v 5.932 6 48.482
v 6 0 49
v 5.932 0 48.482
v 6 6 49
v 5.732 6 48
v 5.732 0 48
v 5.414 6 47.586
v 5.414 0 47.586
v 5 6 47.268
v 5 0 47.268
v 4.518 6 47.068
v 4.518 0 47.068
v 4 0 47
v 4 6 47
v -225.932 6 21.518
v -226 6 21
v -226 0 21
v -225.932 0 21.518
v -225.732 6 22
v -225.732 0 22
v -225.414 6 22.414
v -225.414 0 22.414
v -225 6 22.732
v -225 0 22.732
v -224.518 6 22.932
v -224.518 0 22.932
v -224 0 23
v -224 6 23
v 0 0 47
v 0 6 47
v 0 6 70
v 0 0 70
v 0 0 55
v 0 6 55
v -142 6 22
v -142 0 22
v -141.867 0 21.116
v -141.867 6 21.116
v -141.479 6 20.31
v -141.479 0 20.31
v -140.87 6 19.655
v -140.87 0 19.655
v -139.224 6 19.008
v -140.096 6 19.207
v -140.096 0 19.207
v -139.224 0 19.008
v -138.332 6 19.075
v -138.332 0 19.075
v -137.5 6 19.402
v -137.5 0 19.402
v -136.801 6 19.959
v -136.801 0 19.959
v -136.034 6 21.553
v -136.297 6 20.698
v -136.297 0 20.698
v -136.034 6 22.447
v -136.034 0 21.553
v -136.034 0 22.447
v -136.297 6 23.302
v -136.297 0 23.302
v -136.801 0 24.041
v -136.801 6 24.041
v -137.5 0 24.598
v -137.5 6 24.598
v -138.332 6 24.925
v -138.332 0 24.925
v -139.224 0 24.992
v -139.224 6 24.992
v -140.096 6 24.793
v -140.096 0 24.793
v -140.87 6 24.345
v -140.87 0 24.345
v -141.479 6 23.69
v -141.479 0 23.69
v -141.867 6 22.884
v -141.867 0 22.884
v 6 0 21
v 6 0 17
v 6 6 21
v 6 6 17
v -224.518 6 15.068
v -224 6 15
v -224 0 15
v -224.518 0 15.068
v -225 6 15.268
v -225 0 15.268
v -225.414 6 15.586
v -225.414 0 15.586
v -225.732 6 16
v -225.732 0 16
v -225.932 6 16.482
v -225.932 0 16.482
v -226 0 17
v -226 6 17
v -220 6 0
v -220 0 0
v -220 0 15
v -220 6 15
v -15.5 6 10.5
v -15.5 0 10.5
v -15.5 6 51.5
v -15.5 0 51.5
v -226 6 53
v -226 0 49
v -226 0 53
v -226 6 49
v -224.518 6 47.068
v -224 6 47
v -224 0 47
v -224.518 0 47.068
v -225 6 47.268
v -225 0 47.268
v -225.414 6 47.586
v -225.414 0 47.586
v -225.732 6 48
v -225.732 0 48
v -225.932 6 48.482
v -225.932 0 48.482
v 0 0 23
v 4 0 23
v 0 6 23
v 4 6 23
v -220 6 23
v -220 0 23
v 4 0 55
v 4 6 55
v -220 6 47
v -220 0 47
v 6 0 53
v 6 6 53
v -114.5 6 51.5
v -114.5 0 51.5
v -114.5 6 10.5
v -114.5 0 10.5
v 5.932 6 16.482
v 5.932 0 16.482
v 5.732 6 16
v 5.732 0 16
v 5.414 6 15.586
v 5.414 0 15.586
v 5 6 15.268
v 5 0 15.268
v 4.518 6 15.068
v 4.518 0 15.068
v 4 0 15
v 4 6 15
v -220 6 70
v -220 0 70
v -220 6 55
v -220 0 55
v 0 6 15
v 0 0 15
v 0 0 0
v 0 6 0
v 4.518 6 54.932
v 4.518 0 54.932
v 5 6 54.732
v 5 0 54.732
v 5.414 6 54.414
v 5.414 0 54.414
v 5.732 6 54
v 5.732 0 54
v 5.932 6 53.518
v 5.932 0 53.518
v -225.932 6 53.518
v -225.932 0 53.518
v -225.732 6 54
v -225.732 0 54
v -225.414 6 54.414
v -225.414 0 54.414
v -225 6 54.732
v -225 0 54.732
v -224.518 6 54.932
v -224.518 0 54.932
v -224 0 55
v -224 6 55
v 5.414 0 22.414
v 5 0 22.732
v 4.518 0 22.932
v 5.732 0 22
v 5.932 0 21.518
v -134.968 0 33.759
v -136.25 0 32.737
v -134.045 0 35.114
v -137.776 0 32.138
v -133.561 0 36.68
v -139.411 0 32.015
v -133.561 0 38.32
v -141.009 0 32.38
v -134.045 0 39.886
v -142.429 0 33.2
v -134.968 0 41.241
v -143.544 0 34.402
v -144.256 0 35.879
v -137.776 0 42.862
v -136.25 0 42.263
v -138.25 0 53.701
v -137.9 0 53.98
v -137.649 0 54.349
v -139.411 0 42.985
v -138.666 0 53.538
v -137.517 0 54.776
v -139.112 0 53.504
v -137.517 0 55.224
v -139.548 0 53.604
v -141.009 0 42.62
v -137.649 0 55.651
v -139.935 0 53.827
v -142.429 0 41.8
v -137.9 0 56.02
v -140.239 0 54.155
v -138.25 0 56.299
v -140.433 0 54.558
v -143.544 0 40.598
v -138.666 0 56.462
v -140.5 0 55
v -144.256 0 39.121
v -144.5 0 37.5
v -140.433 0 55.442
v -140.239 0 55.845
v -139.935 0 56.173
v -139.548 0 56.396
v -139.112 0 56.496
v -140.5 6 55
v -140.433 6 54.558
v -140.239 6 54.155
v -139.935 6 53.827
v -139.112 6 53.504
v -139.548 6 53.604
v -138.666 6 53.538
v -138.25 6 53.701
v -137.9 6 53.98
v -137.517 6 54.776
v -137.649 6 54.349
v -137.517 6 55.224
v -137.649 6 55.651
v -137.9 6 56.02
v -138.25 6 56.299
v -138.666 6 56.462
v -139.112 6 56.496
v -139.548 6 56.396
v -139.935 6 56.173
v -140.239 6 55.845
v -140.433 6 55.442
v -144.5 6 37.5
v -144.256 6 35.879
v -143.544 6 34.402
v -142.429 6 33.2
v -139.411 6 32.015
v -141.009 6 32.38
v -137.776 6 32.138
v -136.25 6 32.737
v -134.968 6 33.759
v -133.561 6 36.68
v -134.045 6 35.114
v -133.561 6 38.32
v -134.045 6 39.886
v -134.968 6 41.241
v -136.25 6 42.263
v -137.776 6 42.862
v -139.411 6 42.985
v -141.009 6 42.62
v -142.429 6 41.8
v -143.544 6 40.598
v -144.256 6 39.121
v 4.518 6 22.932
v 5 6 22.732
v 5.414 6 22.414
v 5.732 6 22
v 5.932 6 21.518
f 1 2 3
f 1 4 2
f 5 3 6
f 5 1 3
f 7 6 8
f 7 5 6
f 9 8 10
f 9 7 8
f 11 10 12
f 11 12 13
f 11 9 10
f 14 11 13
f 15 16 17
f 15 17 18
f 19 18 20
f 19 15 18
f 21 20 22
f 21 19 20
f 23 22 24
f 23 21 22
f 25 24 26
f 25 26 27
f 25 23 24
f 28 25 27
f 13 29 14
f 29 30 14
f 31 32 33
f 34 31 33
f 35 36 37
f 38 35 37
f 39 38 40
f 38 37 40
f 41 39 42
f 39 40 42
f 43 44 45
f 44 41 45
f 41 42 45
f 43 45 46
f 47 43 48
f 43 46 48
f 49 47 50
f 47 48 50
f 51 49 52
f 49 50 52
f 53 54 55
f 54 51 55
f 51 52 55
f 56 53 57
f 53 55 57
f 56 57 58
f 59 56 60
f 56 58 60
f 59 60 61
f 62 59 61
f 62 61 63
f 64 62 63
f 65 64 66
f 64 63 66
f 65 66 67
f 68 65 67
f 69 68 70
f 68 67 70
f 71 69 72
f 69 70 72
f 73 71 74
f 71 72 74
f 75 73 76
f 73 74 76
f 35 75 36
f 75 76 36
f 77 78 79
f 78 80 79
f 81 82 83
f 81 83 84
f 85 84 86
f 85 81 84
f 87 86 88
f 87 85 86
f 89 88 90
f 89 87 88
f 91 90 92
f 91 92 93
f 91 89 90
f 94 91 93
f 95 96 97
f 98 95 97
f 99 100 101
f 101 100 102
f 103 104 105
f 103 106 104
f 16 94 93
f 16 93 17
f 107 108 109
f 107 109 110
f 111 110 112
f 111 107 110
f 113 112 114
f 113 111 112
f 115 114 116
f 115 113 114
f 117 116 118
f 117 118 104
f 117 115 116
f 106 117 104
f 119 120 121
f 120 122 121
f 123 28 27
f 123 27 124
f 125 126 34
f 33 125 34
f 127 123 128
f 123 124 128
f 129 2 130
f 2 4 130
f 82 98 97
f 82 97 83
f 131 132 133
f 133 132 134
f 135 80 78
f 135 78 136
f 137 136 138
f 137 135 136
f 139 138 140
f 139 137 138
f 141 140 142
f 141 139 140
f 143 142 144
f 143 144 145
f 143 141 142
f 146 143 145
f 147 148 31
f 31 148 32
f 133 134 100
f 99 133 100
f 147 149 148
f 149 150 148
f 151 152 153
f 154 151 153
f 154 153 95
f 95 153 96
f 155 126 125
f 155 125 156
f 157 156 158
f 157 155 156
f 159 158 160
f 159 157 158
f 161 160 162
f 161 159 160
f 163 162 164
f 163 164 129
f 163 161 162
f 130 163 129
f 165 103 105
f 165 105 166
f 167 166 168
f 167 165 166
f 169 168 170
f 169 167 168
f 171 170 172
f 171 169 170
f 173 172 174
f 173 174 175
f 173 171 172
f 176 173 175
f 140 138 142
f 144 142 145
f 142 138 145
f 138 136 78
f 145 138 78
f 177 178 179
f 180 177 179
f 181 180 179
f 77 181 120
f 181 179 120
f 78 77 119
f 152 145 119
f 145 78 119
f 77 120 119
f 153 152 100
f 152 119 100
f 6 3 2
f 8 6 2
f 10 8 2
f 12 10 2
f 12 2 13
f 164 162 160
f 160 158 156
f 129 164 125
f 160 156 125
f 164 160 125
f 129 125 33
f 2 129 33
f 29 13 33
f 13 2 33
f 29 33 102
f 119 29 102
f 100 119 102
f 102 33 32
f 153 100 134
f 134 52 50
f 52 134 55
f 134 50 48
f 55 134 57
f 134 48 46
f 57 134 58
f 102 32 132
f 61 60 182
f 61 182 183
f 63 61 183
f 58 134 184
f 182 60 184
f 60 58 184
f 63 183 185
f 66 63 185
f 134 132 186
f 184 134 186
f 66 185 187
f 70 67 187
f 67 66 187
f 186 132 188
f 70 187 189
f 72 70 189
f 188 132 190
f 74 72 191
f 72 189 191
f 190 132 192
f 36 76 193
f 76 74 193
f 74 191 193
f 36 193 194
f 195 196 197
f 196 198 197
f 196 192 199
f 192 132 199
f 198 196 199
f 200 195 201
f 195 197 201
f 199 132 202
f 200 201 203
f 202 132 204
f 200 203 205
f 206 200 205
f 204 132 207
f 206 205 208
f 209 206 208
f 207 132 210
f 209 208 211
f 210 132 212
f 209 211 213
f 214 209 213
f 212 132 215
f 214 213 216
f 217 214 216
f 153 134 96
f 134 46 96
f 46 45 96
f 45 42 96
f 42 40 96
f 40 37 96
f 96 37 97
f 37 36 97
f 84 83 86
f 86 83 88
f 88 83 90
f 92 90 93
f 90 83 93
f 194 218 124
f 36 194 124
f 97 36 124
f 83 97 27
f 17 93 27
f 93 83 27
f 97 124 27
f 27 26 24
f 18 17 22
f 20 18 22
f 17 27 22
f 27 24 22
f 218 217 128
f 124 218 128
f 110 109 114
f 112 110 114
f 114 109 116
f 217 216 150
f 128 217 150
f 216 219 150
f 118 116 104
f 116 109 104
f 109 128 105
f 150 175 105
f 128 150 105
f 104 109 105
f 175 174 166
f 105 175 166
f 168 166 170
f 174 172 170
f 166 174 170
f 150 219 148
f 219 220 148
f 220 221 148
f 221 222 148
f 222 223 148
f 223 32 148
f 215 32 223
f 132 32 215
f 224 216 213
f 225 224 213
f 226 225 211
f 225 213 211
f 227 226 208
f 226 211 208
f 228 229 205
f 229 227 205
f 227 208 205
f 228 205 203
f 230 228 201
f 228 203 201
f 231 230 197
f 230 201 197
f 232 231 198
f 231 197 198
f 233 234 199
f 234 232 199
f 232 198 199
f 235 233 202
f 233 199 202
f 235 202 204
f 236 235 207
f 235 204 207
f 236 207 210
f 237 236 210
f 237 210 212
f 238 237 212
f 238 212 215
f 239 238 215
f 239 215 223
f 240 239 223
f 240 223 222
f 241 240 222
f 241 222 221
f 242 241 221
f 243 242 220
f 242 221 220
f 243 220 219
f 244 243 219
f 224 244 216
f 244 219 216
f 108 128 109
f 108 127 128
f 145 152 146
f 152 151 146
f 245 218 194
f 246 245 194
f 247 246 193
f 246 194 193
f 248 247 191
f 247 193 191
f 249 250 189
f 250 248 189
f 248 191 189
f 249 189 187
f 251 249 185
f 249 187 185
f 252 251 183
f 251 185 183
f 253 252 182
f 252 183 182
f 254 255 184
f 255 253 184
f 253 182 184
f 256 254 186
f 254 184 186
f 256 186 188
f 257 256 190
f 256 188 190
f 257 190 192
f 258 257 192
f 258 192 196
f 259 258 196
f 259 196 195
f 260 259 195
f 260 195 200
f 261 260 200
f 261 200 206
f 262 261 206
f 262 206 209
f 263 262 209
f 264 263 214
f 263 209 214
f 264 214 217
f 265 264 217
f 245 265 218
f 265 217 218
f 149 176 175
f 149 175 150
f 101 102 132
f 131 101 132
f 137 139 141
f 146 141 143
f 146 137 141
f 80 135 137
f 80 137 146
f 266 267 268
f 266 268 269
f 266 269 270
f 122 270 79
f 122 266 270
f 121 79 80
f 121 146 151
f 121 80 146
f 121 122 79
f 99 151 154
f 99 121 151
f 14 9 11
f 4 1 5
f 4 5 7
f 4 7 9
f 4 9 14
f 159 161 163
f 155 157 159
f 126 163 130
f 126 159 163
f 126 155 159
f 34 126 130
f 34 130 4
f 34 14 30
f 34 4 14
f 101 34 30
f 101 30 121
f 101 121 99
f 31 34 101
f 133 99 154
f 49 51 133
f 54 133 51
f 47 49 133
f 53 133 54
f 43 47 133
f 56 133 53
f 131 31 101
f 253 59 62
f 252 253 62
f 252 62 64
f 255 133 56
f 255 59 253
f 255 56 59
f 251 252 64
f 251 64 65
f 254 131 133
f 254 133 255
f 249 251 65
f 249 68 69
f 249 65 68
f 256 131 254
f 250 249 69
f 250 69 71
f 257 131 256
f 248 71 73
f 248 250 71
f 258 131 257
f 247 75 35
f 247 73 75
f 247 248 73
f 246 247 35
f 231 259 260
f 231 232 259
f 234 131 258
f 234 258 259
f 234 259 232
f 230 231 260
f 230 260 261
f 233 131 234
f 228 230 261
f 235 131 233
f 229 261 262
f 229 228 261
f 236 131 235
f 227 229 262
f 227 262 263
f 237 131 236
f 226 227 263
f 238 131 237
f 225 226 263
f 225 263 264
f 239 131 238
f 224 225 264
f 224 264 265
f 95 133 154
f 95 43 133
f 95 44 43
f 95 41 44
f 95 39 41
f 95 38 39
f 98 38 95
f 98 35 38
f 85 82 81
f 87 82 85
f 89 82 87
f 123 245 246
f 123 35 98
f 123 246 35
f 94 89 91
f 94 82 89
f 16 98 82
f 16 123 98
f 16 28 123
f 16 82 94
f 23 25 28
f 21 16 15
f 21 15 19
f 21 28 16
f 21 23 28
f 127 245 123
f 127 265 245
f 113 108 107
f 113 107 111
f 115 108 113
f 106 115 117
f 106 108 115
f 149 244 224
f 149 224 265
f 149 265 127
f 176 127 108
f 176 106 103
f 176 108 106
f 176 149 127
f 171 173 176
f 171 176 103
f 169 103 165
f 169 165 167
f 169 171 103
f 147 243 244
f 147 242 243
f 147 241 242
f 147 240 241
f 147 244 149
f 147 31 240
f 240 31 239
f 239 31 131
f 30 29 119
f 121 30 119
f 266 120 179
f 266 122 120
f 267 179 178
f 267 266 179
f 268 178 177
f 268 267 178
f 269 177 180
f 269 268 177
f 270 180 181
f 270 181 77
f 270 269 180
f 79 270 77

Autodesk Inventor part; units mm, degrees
ref_plane "YZ Plane" through (0, 0, 0) normal (1, 0, 0) x (0, 1, 0)
ref_plane "XZ Plane" through (0, 0, 0) normal (0, 1, 0) x (-1, 0, 0)
ref_plane "XY Plane" through (0, 0, 0) normal (0, 0, 1) x (1, 0, 0)
sketch "Sketch1" plane through (0, 0, 0) normal (0, 1, 0) x (-1, 0, 0)
  line L0 (0, 0) -> (220, 0)
  line L1 (220, 0) -> (220, 70)
  line L2 (220, 70) -> (0, 70)
  line L3 (0, 70) -> (0, 0)
  line L4 (16, 51) -> (114, 51) construction
  line L5 (114, 51) -> (114, 11) construction
  line L6 (114, 11) -> (16, 11) construction
  line L7 (16, 11) -> (16, 51) construction
  line L8 (15.5, 51.5) -> (114.5, 51.5)
  line L9 (114.5, 51.5) -> (114.5, 10.5)
  line L10 (114.5, 10.5) -> (15.5, 10.5)
  line L11 (15.5, 10.5) -> (15.5, 51.5)
  circle A0 centre (139, 55) radius 1.5
  circle A1 centre (139, 37.5) radius 5.5
  circle A2 centre (139, 22) radius 3
  line L12 (2, 65) -> (152, 65) construction
  line L13 (152, 65) -> (152, 10) construction
  line L14 (152, 10) -> (2, 10) construction
  line L15 (2, 10) -> (2, 65) construction
  point P0 (65, 51.5)
  point P1 (65, 51)
  point P2 (114, 31)
  point P3 (114.5, 31)
  dimension "d11" = 220
  dimension "d106" = 40
  dimension "d107" = 98
  dimension "d108" = 99
  dimension "d109" = 41
  dimension "d110" = 25
  dimension "d111" = 6
  dimension "d112" = 15.5
  dimension "d113" = 17.5
  dimension "d114" = 13.5
  dimension "d115" = 3
  dimension "d116" = 11
  dimension "d117" = 55
  dimension "d118" = 150
  dimension "d119" = 14
  dimension "d120" = 14
  dimension "d121" = 5
  dimension "d122" = 2
  dimension "d123" = 10
extrude "Extrusion8" add sketch "Sketch1" along normal blind 6
sketch "Sketch7" plane through (0, 6, 0) normal (0, 1, 0) x (1, 0, 0)
  line L0 (0, 0) -> (-220, 0) projected
  line L1 (-220, 0) -> (-220, -70) projected
  line L2 (-220, -70) -> (0, -70) projected
  line L3 (0, -70) -> (0, 0) projected
  line L4 (-220, -15) -> (-224, -15)
  line L5 (-226, -17) -> (-226, -21)
  line L6 (-224, -23) -> (-220, -23)
  line L7 (-220, -23) -> (-220, -15)
  line L8 (-220, -47) -> (-224, -47)
  line L9 (-226, -49) -> (-226, -53)
  line L10 (-224, -55) -> (-220, -55)
  line L11 (-220, -55) -> (-220, -47)
  line L12 (0, -15) -> (4, -15)
  line L13 (6, -17) -> (6, -21)
  line L14 (4, -23) -> (0, -23)
  line L15 (0, -23) -> (0, -15)
  line L16 (0, -47) -> (4, -47)
  line L17 (6, -49) -> (6, -53)
  line L18 (4, -55) -> (0, -55)
  line L19 (0, -55) -> (0, -47)
  arc A0 (-224, -15) -> (-226, -17) centre (-224, -17) ccw
  arc A1 (-226, -21) -> (-224, -23) centre (-224, -21) ccw
  arc A2 (-224, -47) -> (-226, -49) centre (-224, -49) ccw
  arc A3 (-226, -53) -> (-224, -55) centre (-224, -53) ccw
  arc A4 (6, -17) -> (4, -15) centre (4, -17) ccw
  arc A5 (4, -23) -> (6, -21) centre (4, -21) ccw
  arc A6 (6, -49) -> (4, -47) centre (4, -49) ccw
  arc A7 (4, -55) -> (6, -53) centre (4, -53) ccw
  dimension "d126" = 2
  dimension "d127" = 15
  dimension "d128" = 8
  dimension "d129" = 8
  dimension "d130" = 15
  dimension "d131" = 6
  dimension "d132" = 6
extrude "Extrusion9" add sketch "Sketch7" against normal blind 6 contours L12 A4 L13 A5 L14 L3 | L1 L6 A1 L5 A0 L4 | L16 A6 L17 A7 L18 L3 | L1 L10 A3 L9 A2 L8
properties part number "front_panel_2004_display"
